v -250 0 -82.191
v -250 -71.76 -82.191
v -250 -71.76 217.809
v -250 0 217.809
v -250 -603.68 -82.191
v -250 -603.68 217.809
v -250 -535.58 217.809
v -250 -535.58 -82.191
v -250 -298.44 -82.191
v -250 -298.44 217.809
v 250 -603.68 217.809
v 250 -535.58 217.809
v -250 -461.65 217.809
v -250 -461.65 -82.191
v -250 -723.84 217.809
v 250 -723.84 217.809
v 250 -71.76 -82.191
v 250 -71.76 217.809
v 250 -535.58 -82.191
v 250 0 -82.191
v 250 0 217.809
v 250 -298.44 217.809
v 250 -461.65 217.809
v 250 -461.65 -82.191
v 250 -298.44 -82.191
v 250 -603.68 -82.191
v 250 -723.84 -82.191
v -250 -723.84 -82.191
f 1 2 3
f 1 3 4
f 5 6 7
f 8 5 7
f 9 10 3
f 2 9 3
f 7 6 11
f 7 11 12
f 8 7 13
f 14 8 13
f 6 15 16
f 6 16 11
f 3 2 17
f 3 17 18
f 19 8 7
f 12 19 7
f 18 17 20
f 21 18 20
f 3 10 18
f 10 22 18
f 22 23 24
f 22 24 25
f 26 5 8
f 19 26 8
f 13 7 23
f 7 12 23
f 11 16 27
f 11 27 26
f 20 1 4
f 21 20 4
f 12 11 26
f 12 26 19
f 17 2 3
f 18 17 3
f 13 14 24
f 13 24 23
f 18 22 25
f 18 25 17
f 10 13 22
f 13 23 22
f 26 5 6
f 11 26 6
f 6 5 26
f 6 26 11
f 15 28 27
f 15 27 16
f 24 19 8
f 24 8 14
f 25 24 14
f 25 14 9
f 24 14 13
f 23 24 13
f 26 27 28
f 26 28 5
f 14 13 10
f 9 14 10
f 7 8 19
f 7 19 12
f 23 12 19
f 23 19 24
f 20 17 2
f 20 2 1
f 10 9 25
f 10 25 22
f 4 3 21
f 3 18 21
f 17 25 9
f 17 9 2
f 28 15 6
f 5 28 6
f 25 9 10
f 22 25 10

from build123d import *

# Parameters (mm, degrees)
F1_W     = 163.21
F1_H     = 300
F2_DEPTH = 250
F1_W_2   = 73.93
F3_DEPTH = 250
F1_W_3   = 68.1
F4_DEPTH = 250
F1_W_4   = 120.16
F5_DEPTH = 250
F0_W     = 71.76
F0_H     = 300
F6_DEPTH = 250
F1_W_5   = 226.68
F8_DEPTH = 250


with BuildPart() as f2:
    # F1 (on face) → F2 (new body, symmetric)
    with BuildSketch(Plane.YZ):
        with Locations((-380.045, 67.8092256188)):
            Rectangle(F1_W, F1_H)
    extrude(amount=F2_DEPTH, both=True)


with BuildPart() as f3:
    # F1 (on face) → F3 (new body, symmetric)
    with BuildSketch(Plane.YZ):
        with Locations((-498.615, 67.8092256188)):
            Rectangle(F1_W_2, F1_H)
    extrude(amount=F3_DEPTH, both=True)


with BuildPart() as f4:
    # F1 (on face) → F4 (new body, symmetric)
    with BuildSketch(Plane.YZ):
        with Locations((-569.63, 67.8092256188)):
            Rectangle(F1_W_3, F1_H)
    extrude(amount=F4_DEPTH, both=True)


with BuildPart() as f5:
    # F1 (on face) → F5 (new body, symmetric)
    with BuildSketch(Plane.YZ):
        with Locations((-663.76, 67.8092256188)):
            Rectangle(F1_W_4, F1_H)
    extrude(amount=F5_DEPTH, both=True)


with BuildPart() as f6:
    # F0 (on Right) → F6 (new body, symmetric)
    with BuildSketch(Plane.YZ):
        with Locations((-35.88, 67.8092256188)):
            Rectangle(F0_W, F0_H)
    extrude(amount=F6_DEPTH, both=True)


with BuildPart() as f8:
    # F1 (on face) → F8 (new body, symmetric)
    with BuildSketch(Plane.YZ):
        with Locations((-185.1, 67.8092256188)):
            Rectangle(F1_W_5, F1_H)
    extrude(amount=F8_DEPTH, both=True)


solid = Compound([f2.part, f3.part, f4.part, f5.part, f6.part, f8.part])
